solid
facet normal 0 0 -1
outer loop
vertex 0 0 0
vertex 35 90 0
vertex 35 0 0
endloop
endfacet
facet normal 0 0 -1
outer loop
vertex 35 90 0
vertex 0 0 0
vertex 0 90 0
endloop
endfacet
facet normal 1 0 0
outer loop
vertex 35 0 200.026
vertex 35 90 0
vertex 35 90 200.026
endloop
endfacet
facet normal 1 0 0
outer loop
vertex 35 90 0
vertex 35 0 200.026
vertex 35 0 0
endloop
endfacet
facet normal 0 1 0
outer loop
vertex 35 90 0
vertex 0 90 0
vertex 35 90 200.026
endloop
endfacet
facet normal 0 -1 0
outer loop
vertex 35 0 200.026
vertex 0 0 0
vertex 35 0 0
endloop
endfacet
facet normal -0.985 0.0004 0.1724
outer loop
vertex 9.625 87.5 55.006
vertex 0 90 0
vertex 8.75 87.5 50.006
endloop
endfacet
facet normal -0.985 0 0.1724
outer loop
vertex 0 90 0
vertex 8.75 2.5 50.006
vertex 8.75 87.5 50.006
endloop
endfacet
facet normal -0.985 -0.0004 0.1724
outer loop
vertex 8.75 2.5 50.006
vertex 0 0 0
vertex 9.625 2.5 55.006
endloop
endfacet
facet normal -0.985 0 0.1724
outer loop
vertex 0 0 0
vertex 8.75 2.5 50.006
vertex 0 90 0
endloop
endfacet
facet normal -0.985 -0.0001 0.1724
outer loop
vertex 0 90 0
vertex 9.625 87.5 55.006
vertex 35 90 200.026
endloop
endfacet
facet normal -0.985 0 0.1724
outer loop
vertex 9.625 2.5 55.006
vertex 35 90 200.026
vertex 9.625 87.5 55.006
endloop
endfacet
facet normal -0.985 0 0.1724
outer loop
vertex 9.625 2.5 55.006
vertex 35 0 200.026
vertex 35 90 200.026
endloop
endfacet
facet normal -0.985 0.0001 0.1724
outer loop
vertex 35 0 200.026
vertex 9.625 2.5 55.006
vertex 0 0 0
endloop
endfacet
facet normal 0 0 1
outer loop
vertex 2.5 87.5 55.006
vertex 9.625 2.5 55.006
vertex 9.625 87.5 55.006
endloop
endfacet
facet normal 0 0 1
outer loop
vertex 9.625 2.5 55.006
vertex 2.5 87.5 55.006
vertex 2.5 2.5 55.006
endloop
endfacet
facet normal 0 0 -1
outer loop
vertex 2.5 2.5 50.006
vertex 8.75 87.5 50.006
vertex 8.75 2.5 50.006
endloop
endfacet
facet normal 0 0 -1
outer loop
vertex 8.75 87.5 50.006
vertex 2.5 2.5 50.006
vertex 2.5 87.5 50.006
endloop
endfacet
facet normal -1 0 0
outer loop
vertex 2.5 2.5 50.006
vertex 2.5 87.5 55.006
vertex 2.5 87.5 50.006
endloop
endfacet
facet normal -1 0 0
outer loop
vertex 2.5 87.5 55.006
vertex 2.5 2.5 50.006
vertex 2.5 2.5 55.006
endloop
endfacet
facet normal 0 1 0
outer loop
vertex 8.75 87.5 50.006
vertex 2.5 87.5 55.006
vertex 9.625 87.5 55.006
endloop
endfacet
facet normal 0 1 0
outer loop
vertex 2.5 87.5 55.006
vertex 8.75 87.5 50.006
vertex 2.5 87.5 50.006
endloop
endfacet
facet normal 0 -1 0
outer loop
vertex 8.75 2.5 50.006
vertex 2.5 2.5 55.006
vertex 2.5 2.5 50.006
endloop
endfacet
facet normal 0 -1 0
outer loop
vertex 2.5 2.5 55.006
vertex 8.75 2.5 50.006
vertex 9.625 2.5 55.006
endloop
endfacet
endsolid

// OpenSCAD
// four inverted pyramids about the origing
//
// width = the width of the base of a single pyramid
// angle = angle of the slope of a pyramid

width_t = 90;
length_t = 35;
angle = 85;
height_t = length_t / 2 * tan(angle);

echo(height_t);

width_c = width_t -5;
length_c = length_t - 5;
height_c = 5;

points = [
  [ 0, 0, 0 ],                  // 0
  [ 0, width_t, 0 ],              // 1
  [ length_t, width_t, 0 ],         // 2
  [ length_t, 0, 0 ],             // 3

  [ length_t, width_t, height_t ],    // 4
  [ length_t, 0, height_t],         // 5
];

faces = [
  // bottom face
  [ 0, 1, 2 ],
  [ 2, 3, 0 ],

  // left face
  [ 2, 4, 5 ],
  [ 3, 2, 5 ],

  // back face
  [ 4, 2, 1 ],

  // front face
  [ 0, 3, 5 ],

  // top face
  [ 5, 1, 0 ],
  [ 5, 4, 1 ],
  
];

union() {
polyhedron(points, faces);

translate([ (length_t - length_c) / 2 , (width_t - width_c) / 2 , height_t / 4 ])
cube(size = [ length_c, width_c, height_c ]);
}
